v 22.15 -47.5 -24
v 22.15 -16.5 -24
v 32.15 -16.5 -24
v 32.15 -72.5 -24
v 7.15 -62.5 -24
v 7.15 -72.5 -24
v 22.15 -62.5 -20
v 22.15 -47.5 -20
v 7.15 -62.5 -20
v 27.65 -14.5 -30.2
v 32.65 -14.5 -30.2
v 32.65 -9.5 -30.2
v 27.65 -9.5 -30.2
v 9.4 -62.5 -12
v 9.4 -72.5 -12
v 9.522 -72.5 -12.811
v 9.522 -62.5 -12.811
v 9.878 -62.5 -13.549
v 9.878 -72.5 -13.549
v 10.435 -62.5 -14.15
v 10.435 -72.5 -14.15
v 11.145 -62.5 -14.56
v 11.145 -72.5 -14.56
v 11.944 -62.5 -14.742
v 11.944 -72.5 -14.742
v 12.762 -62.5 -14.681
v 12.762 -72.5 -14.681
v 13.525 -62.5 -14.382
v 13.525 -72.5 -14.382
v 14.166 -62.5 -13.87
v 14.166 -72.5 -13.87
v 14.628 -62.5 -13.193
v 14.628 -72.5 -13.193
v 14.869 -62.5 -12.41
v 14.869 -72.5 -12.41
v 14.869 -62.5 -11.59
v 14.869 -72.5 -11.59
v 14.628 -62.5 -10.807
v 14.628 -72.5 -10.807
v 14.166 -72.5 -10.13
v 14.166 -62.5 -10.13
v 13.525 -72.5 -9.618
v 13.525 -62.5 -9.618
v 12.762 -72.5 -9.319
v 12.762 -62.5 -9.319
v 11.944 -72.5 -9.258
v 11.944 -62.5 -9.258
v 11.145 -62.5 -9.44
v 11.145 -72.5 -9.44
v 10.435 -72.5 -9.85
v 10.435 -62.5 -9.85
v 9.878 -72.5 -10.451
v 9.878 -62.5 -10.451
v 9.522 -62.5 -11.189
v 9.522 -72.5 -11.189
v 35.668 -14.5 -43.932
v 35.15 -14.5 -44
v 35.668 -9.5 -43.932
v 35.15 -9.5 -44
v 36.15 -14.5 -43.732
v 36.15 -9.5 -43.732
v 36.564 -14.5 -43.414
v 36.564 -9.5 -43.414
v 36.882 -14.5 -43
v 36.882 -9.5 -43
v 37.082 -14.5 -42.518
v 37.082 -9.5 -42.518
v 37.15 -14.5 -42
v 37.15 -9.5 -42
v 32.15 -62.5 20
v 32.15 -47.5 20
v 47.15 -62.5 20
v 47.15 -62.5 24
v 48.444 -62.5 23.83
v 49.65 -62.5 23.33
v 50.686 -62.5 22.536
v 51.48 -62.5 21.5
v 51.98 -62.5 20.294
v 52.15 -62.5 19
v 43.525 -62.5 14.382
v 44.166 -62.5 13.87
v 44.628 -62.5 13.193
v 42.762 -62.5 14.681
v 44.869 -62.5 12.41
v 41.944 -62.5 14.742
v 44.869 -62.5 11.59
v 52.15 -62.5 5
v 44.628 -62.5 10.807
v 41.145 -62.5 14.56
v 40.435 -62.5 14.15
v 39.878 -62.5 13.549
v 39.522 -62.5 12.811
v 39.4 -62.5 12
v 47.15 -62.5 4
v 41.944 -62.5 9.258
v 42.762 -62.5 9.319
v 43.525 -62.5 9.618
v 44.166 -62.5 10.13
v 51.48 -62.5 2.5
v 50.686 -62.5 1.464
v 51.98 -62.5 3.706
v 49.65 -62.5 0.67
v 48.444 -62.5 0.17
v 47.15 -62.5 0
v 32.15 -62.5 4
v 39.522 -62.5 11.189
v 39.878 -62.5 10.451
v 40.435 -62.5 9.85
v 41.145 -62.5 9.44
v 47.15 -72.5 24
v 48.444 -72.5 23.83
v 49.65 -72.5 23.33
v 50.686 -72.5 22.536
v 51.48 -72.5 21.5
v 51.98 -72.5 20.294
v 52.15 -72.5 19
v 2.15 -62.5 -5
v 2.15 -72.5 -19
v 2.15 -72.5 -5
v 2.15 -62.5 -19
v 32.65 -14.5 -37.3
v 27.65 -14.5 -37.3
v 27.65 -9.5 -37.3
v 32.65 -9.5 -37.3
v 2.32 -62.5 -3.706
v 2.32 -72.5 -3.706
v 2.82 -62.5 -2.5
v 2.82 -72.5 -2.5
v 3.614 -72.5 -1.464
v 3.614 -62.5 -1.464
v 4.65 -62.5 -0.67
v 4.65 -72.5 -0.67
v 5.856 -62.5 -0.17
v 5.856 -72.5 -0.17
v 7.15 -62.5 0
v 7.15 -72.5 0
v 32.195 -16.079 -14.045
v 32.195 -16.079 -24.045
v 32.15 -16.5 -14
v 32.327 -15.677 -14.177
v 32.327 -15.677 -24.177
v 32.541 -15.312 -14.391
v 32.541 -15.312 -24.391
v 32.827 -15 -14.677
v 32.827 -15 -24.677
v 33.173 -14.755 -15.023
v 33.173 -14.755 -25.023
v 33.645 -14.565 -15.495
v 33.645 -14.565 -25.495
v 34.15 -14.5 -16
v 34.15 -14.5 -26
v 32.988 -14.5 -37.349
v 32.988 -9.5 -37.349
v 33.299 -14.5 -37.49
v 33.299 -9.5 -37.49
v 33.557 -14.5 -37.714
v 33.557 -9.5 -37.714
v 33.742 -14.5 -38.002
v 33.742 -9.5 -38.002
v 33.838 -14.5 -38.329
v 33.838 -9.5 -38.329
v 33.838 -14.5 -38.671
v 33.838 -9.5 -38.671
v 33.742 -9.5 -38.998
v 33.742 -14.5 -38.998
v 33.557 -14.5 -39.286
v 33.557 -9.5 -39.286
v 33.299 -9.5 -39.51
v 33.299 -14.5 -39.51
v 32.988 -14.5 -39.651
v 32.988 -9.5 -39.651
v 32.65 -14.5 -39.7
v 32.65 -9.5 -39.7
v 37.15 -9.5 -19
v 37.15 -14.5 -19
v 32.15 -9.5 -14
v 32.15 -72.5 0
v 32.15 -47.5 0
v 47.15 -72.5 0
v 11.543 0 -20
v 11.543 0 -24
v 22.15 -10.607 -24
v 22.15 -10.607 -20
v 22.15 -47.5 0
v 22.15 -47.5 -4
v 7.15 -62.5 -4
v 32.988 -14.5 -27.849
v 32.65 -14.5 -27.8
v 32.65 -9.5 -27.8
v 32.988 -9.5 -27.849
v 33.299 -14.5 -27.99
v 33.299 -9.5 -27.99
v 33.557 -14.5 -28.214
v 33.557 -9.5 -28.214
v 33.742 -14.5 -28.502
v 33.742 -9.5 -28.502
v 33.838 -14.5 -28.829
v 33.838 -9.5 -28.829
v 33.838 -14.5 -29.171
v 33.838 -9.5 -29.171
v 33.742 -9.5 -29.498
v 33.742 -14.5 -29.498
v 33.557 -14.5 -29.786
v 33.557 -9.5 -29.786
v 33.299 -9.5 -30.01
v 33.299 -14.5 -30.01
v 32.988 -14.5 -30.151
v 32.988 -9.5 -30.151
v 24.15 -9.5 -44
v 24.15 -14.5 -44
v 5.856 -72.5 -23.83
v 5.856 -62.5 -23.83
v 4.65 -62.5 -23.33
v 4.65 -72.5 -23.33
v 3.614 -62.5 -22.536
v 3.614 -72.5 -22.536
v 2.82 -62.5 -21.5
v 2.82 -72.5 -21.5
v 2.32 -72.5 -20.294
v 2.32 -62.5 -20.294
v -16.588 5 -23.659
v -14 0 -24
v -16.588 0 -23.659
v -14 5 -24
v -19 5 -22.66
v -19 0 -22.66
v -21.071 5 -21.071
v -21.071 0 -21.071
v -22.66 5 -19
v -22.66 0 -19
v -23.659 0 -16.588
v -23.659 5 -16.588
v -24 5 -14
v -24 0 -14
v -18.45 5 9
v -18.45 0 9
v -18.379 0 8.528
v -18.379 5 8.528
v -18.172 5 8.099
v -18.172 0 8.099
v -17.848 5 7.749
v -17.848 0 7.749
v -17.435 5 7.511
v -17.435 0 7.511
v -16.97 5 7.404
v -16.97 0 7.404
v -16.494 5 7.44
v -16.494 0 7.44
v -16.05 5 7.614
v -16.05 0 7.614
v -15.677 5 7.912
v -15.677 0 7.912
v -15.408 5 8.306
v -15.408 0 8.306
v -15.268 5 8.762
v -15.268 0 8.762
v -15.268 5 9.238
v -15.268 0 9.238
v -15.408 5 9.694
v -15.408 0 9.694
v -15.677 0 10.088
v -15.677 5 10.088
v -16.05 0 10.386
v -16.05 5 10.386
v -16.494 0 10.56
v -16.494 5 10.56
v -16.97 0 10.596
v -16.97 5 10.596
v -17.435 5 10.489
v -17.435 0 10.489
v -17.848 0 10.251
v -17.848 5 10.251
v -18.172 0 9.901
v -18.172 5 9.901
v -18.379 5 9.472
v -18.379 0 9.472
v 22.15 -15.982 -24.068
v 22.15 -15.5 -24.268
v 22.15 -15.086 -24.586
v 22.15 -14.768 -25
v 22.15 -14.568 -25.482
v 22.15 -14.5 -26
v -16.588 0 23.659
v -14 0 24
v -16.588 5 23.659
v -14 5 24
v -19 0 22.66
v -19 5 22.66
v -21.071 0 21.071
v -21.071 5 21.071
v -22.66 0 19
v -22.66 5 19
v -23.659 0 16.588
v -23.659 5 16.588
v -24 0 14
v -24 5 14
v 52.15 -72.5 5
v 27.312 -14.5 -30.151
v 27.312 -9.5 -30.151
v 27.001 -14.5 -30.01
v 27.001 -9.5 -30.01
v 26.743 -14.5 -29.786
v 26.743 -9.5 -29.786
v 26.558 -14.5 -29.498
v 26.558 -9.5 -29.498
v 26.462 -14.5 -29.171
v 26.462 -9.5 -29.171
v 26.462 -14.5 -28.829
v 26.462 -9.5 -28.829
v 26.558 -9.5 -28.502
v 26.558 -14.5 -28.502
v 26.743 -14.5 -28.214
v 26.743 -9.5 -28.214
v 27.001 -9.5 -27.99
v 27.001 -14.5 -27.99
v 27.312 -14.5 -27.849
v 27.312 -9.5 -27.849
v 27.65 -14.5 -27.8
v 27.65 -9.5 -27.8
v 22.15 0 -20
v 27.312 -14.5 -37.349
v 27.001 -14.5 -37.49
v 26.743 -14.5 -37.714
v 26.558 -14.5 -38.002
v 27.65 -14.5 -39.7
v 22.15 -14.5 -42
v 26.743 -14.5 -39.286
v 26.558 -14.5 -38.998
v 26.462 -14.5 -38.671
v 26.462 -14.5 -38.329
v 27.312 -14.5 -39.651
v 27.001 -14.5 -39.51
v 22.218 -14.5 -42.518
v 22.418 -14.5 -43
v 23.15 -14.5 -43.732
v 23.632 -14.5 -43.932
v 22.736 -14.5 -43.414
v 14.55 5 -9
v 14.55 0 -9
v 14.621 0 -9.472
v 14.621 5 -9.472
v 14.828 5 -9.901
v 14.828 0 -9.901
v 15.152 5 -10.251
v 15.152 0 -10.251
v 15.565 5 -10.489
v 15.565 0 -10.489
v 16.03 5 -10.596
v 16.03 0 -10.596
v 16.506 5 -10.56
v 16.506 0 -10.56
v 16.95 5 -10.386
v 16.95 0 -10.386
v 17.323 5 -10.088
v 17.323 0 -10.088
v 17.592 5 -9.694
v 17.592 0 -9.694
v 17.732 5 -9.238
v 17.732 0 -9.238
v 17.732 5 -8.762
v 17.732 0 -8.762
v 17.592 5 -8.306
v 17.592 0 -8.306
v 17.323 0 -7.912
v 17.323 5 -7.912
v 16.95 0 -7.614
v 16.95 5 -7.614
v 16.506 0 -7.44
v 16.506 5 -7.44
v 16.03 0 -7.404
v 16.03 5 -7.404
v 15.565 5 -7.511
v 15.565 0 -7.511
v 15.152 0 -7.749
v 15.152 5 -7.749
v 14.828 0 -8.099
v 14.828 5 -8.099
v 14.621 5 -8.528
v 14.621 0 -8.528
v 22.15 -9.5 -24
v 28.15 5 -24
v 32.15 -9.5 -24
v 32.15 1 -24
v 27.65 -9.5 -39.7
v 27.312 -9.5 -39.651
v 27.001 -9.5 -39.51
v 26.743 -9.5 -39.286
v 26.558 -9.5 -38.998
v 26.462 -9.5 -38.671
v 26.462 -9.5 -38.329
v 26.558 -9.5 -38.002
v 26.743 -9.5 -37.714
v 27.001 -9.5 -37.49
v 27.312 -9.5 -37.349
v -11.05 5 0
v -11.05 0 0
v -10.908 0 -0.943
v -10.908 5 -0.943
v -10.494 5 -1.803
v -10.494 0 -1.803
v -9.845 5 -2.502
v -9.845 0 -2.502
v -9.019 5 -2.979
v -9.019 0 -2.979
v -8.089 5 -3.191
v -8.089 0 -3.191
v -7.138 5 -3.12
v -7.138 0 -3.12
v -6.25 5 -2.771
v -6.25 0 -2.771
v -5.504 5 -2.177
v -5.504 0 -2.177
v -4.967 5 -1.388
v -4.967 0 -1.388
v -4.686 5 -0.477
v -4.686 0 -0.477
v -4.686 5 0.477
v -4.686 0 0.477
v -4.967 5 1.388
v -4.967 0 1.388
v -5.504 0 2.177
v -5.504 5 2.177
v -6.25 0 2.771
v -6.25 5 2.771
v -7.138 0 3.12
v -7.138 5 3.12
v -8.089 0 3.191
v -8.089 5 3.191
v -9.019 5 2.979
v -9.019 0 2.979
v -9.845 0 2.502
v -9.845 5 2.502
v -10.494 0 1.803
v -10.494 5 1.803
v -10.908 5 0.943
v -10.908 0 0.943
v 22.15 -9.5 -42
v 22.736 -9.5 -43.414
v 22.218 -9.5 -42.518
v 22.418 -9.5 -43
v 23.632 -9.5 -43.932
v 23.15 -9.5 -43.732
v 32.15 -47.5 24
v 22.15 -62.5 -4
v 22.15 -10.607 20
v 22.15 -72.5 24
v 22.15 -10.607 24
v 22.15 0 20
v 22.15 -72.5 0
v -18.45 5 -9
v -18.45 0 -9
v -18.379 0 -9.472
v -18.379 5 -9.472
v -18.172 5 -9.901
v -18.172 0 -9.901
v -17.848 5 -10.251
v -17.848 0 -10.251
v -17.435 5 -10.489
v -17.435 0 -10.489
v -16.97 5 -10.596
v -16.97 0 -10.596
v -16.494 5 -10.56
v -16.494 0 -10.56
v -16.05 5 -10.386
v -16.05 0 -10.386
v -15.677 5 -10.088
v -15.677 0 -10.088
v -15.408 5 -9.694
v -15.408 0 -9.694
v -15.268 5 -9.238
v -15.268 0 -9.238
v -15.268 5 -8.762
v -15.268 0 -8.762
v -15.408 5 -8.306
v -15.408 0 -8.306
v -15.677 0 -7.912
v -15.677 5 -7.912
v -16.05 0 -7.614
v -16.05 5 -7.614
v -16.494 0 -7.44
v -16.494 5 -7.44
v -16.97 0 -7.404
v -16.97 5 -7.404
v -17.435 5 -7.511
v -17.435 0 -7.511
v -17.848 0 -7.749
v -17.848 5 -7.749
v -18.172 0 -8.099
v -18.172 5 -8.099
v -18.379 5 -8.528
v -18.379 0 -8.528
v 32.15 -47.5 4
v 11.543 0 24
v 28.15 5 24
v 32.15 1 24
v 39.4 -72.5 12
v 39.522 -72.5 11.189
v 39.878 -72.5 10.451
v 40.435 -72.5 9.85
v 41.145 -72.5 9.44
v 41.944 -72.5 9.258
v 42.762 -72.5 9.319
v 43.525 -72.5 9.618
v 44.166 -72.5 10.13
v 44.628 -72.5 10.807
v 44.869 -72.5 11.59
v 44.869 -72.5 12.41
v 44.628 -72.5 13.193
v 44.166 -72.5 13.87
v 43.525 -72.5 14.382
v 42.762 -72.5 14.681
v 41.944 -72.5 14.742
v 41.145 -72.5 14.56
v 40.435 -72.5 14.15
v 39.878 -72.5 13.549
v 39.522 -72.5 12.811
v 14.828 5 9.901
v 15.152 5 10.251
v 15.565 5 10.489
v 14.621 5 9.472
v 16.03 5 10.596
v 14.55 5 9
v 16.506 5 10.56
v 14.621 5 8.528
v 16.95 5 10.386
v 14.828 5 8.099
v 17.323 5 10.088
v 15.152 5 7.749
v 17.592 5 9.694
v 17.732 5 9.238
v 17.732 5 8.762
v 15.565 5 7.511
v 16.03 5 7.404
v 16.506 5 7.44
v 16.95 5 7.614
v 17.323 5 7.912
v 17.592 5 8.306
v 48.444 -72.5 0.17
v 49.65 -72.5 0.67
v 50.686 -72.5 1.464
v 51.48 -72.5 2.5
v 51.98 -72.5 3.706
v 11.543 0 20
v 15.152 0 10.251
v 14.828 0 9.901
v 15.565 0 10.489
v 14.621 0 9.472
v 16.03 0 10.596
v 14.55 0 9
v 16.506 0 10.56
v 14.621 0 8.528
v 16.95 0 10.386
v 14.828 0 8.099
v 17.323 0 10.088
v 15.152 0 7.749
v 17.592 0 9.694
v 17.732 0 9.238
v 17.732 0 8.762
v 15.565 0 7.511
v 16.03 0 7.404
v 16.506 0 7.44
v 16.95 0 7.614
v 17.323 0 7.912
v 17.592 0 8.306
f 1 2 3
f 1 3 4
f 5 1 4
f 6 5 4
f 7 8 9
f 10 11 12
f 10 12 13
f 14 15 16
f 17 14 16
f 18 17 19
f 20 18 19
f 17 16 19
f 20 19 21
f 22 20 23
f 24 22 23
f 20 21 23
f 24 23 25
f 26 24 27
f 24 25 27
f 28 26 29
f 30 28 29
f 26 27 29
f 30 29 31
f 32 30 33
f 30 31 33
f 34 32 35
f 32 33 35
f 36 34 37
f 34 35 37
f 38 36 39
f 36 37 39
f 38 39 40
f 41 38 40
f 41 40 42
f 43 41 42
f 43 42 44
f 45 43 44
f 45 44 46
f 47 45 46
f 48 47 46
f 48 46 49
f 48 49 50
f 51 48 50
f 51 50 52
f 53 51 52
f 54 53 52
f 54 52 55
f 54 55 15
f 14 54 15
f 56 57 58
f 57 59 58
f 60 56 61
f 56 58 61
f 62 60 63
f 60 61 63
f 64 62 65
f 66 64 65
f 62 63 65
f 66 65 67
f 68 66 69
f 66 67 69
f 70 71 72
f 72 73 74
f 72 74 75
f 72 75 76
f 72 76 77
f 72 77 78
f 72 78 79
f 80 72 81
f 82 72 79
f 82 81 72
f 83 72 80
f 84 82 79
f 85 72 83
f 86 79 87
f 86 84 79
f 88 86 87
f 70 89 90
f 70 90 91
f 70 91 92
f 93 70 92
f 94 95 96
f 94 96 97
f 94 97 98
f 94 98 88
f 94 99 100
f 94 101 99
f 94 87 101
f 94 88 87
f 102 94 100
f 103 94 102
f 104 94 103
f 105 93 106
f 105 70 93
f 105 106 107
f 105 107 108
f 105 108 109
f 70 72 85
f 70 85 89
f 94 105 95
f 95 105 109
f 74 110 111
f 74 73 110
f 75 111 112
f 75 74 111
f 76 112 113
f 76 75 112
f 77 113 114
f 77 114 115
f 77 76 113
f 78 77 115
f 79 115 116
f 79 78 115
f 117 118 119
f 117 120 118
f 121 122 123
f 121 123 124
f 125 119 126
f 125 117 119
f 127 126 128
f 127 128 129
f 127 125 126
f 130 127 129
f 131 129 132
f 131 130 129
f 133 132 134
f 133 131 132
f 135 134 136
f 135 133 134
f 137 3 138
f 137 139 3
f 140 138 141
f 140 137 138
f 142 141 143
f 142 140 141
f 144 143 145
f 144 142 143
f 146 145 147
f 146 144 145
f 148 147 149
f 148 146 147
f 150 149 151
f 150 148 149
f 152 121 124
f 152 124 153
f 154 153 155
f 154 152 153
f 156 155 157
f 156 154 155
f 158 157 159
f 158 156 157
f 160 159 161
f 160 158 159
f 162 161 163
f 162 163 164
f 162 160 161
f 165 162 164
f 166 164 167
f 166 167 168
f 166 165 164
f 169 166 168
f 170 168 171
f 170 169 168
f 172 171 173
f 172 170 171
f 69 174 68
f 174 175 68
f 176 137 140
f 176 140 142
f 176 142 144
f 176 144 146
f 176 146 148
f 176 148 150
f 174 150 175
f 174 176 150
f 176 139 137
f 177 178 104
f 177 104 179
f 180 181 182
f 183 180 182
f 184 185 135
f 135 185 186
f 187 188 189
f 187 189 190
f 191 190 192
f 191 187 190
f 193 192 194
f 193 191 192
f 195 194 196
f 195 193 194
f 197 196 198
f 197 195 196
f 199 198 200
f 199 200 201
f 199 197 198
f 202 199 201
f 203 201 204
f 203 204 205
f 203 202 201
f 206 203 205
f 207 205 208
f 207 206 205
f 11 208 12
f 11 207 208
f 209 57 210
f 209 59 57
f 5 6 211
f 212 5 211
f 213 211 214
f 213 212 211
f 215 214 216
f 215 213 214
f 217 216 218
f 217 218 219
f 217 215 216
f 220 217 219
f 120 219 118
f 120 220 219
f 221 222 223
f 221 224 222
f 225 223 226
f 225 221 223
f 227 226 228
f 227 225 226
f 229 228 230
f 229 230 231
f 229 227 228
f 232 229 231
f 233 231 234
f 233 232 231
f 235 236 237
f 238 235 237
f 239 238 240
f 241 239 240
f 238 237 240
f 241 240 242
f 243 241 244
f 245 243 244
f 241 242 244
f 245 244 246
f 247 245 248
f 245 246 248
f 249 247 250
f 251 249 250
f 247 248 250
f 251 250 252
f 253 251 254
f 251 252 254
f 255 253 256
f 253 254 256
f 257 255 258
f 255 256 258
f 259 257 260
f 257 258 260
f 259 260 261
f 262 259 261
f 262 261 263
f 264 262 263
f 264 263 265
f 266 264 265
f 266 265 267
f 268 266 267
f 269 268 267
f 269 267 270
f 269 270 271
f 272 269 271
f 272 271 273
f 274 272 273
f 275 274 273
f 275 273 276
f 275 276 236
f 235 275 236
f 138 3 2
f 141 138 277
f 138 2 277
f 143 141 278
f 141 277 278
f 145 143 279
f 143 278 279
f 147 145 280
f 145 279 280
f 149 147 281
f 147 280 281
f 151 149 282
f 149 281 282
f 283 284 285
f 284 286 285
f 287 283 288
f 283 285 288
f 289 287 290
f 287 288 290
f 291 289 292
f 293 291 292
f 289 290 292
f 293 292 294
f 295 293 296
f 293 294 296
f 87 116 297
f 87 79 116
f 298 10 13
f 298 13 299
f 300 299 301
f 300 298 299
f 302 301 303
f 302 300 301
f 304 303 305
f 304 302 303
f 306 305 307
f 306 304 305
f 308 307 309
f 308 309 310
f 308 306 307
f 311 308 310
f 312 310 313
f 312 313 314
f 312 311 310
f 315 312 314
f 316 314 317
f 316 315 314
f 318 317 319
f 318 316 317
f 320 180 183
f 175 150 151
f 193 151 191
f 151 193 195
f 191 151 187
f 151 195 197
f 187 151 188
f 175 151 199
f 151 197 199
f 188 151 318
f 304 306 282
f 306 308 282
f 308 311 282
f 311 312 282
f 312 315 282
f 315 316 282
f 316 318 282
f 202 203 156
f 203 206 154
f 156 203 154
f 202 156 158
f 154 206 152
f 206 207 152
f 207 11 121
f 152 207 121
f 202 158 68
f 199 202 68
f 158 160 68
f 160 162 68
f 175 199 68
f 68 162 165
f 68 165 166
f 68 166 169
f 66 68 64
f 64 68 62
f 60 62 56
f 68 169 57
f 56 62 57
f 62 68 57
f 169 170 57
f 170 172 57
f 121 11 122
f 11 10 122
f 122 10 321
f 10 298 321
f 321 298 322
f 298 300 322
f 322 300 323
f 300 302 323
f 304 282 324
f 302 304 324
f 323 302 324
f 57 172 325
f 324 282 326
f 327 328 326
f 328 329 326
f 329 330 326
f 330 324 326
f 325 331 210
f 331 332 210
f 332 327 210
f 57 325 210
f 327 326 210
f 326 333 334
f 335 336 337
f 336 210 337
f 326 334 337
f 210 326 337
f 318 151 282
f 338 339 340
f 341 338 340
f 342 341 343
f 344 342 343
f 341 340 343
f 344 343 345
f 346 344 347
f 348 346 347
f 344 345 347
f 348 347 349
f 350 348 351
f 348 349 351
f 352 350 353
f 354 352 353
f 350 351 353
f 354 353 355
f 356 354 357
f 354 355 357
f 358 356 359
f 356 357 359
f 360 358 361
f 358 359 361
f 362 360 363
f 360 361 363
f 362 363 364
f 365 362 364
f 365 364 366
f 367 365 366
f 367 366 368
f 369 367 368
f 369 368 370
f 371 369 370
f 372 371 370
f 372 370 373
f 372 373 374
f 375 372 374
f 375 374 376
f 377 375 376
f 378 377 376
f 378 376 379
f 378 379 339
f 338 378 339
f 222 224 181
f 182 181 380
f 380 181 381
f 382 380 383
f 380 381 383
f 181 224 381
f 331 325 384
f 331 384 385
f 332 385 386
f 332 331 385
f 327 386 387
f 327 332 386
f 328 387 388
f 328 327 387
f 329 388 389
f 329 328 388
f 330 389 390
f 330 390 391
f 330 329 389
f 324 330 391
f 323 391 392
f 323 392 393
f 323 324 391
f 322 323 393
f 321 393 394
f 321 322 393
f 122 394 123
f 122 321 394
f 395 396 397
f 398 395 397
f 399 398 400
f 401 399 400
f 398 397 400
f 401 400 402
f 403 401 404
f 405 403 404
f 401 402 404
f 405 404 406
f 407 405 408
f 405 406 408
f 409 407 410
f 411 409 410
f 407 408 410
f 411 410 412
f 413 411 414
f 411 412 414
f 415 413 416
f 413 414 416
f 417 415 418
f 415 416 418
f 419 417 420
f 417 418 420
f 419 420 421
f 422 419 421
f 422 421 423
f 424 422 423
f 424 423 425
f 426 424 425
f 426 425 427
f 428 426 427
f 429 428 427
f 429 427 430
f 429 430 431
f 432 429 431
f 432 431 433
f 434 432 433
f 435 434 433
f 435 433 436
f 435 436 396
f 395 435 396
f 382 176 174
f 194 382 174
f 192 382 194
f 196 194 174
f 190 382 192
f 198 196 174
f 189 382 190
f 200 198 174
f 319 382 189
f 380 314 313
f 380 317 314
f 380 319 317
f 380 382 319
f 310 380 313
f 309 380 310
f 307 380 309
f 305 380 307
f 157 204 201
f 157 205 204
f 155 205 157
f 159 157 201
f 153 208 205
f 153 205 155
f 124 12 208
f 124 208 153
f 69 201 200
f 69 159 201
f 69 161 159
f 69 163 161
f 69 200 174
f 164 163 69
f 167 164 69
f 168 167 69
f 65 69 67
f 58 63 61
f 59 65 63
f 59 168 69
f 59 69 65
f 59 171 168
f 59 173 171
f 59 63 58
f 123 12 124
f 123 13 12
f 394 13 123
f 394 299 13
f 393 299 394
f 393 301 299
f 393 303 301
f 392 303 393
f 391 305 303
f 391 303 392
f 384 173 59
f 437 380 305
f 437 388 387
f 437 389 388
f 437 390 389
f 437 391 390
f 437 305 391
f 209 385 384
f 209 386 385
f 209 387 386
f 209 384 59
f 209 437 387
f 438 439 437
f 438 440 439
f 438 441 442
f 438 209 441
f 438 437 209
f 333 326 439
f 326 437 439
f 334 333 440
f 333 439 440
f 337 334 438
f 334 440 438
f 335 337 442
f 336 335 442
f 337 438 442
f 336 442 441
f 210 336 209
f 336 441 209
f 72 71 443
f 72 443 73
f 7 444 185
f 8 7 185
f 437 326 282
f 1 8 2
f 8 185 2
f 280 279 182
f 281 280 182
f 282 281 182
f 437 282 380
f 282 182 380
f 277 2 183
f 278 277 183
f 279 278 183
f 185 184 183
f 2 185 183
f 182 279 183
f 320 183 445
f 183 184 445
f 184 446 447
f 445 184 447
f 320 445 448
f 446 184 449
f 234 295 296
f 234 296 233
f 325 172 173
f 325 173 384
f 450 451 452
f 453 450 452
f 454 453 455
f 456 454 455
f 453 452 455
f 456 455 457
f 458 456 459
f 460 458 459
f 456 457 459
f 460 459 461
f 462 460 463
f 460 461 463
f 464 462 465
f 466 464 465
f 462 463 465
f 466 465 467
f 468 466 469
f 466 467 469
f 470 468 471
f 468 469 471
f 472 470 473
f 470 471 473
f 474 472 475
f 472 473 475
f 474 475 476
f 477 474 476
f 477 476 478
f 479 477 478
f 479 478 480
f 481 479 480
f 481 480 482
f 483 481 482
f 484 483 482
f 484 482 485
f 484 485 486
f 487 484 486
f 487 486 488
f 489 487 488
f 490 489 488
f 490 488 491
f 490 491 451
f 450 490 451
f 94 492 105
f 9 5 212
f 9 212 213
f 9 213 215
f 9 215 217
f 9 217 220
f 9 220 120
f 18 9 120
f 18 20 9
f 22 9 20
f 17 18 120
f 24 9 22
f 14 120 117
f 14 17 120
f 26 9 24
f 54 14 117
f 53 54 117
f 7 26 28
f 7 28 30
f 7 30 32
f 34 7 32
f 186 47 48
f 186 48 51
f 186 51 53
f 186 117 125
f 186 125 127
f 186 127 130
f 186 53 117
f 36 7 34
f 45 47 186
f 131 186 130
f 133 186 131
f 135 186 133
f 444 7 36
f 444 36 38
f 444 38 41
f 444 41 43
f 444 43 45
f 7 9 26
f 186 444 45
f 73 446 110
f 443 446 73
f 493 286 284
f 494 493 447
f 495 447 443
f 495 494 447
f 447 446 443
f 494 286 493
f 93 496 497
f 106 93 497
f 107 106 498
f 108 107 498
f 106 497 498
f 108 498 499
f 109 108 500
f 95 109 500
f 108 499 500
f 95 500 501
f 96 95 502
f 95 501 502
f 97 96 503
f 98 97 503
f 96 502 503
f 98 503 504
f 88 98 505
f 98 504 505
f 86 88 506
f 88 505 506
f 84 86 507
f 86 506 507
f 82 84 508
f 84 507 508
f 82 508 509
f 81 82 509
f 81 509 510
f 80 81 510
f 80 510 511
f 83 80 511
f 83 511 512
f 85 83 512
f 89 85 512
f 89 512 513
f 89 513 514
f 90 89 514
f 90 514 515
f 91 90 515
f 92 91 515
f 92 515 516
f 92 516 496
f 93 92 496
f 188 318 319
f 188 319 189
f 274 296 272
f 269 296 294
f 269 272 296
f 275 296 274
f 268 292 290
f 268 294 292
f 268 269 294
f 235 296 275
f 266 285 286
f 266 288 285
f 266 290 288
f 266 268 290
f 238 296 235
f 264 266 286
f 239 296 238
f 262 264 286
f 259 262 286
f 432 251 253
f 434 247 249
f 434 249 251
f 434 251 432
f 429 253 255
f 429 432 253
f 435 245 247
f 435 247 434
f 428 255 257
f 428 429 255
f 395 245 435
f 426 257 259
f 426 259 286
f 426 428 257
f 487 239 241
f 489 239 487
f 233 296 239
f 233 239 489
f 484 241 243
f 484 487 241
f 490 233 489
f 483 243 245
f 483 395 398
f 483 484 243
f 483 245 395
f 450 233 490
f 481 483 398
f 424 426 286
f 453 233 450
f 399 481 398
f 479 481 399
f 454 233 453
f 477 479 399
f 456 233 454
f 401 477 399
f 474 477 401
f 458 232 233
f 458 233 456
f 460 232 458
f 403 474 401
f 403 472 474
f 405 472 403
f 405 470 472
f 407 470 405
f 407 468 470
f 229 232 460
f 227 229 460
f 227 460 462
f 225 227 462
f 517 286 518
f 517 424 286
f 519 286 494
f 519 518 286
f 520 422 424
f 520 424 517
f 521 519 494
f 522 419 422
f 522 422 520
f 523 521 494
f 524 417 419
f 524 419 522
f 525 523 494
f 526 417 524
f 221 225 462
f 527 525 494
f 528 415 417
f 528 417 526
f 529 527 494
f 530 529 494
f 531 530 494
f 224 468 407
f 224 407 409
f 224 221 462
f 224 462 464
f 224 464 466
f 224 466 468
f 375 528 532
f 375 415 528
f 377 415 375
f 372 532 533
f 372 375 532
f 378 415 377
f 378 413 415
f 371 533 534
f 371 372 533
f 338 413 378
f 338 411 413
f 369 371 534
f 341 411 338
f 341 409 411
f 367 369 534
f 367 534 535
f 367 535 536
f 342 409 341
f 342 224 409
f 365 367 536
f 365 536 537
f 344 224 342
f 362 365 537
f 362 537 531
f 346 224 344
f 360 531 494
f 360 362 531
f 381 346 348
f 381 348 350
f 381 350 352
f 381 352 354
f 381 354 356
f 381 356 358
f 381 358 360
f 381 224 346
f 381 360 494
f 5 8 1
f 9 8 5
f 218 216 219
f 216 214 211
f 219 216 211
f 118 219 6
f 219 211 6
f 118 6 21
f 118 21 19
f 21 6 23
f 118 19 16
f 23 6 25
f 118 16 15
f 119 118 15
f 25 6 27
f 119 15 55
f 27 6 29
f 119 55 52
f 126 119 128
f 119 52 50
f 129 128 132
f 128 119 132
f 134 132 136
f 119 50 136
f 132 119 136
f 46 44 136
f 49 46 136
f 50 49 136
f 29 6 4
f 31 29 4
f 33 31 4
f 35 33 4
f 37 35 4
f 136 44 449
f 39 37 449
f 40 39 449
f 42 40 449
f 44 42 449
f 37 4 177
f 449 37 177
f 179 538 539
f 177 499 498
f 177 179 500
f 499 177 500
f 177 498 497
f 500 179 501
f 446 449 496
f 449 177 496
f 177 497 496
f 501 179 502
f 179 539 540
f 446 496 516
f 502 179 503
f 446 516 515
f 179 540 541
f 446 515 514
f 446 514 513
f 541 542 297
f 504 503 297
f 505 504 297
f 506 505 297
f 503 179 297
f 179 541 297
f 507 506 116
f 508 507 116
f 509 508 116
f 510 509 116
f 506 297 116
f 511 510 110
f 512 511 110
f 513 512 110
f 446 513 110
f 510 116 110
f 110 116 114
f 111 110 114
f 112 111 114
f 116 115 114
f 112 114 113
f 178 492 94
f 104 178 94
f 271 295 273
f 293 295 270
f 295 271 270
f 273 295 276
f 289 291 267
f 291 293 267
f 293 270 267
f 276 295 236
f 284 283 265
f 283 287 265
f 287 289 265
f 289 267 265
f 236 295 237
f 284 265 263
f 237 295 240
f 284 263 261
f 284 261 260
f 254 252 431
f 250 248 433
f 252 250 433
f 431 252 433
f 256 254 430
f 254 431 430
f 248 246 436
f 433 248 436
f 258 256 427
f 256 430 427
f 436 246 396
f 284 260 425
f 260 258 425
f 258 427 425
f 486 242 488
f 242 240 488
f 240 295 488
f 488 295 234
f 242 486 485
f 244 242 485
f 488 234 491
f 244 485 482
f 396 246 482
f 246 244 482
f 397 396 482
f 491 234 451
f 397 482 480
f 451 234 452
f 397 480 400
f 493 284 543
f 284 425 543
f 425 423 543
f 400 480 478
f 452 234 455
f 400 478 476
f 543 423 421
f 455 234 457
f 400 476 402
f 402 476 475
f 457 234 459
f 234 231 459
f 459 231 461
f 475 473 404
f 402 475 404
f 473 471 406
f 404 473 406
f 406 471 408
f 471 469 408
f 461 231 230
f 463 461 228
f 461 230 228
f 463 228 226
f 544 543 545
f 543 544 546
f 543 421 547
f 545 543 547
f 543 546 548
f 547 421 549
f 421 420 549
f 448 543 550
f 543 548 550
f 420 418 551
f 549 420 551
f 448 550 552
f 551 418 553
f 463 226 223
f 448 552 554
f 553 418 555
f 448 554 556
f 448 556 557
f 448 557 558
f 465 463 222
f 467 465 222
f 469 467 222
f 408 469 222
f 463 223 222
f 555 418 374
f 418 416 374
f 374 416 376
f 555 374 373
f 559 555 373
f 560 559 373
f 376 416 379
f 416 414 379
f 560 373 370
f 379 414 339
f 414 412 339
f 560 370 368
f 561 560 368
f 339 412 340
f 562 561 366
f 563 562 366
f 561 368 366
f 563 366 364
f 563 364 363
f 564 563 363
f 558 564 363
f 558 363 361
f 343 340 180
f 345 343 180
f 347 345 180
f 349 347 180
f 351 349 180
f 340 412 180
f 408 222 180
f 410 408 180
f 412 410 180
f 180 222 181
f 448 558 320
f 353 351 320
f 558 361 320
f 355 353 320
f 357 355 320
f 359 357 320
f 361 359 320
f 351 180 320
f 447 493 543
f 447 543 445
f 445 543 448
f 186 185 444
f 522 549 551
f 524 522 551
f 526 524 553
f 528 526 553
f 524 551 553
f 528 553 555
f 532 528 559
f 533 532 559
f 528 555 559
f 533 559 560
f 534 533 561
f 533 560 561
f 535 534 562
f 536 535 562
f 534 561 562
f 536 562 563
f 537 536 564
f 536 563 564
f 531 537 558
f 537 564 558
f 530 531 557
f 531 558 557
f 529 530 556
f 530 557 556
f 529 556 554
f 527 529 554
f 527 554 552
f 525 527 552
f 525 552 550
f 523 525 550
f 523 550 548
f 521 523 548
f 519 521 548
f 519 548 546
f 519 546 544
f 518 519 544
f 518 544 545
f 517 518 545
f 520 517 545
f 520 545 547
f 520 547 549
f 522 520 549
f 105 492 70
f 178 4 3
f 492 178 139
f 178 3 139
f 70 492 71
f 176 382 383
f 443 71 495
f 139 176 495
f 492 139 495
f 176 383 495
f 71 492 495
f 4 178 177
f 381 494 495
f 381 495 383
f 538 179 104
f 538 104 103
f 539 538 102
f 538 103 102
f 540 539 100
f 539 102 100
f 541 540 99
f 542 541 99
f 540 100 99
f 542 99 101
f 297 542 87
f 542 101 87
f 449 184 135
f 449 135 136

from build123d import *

# Parameters (mm, degrees)
SKETCH1_W                 = 56.15
SKETCH1_H                 = 48
BOSS_EXTRUDE1_DEPTH       = 5
SKETCH2_W                 = 10
SKETCH2_H                 = 48
BOSS_EXTRUDE2_DEPTH       = 72.5
SKETCH3_W                 = 24
SKETCH3_H                 = 10
BOSS_EXTRUDE3_DEPTH       = 20
SKETCH20_W                = 24
SKETCH20_H                = 10
BOSS_EXTRUDE5_DEPTH       = 20
FILLET1_R                 = 10
F_1_0MM_DOWEL_HOLE1_D     = 5.5
F_1_0MM_DOWEL_HOLE1_DEPTH = 10
FILLET2_R                 = 5
RIB1_REACH                = 103.39
SKETCH19_WALL_W           = 225.992615606
SKETCH19_WALL_H           = 4
M3_CLEARANCE_HOLE1_D      = 3.2
M3_CLEARANCE_HOLE1_DEPTH  = 5
M6_CLEARANCE_HOLE1_D      = 6.4
CHAMFER2_SIZE             = 4
SKETCH14_W                = 15
SKETCH14_H                = 5
BOSS_EXTRUDE4_DEPTH       = 20
CHAMFER3_SIZE             = 10
FILLET3_R                 = 2
M2_START                  = -14.5
M2_CLEARANCE_SLOT2_DEPTH  = 5
RIB5_REACH                = 103.39
SKETCH21_WALL_W           = 225.992615606
SKETCH21_WALL_H           = 4
BOSS_EXTRUDE6_DEPTH       = 4


# Read off the part's stored shape, not the designer's step: M2 Clearance Slot2
with BuildPart() as part:
    # Sketch1 → Boss-Extrude1 (new body)
    with BuildSketch(Plane(origin=(0, 0, 0), x_dir=(1, 0, 0), z_dir=(0, 1, 0))):
        with Locations((4.075, 0)):
            Rectangle(SKETCH1_W, SKETCH1_H)
    extrude(amount=BOSS_EXTRUDE1_DEPTH)

    # Sketch2 → Boss-Extrude2 (add)
    with BuildSketch(Plane.XZ):
        with Locations((27.15, 0)):
            Rectangle(SKETCH2_W, SKETCH2_H)
    extrude(amount=BOSS_EXTRUDE2_DEPTH)

    # Sketch3 → Boss-Extrude3 (add)
    with BuildSketch(Plane(origin=(32.15, 0, 0), x_dir=(0, 0, -1), z_dir=(1, 0, 0))):
        with Locations((-12, -67.5)):
            Rectangle(SKETCH3_W, SKETCH3_H)
    extrude(amount=BOSS_EXTRUDE3_DEPTH)

    # Sketch20 → Boss-Extrude5 (add)
    with BuildSketch(Plane.ZY.offset(-22.15)):
        with Locations((-12, -67.5)):
            Rectangle(SKETCH20_W, SKETCH20_H)
    extrude(amount=BOSS_EXTRUDE5_DEPTH)

    # Fillet1
    fillet1_edges = [part.edges().sort_by_distance(p)[0] for p in [
        (-24, 2.5, -24),
        (-24, 2.5, 24),
    ]]
    fillet(fillet1_edges, radius=FILLET1_R)

    # Ø1.0mm Dowel Hole1
    with Locations(Plane(origin=(0, -62.5, 0), x_dir=(1, 0, 0), z_dir=(0, 1, 0))):
        with Locations((42.15, -12), (12.15, 12)):
            Hole(F_1_0MM_DOWEL_HOLE1_D / 2, depth=F_1_0MM_DOWEL_HOLE1_DEPTH)

    # Fillet2
    fillet2_edges = [part.edges().sort_by_distance(p)[0] for p in [
        (52.15, -67.5, 24),
        (52.15, -67.5, 0),
        (2.15, -67.5, -24),
        (2.15, -67.5, 0),
    ]]
    fillet(fillet2_edges, radius=FILLET2_R)

    # Sketch19 wall → Rib1 (add, up to next)
    with BuildSketch(Plane(origin=(39.65, -55, 24), x_dir=(0.707106781187, -0.707106781187, 0), z_dir=(0.707106781187, 0.707106781187, 0)), mode=Mode.PRIVATE) as rib1_sk1:
        with Locations((0, 2)):
            Rectangle(SKETCH19_WALL_W, SKETCH19_WALL_H)
    rib1_tool1 = extrude(rib1_sk1.sketch, amount=-RIB1_REACH, mode=Mode.PRIVATE) - part.part
    rib1 = rib1_tool1.solids().sort_by_distance((39.65, -55, 24))[0]
    add(rib1)

    # M3 Clearance Hole1
    with Locations(Plane(origin=(0, 5, 0), x_dir=(1, 0, 0), z_dir=(0, 1, 0))):
        with Locations((-16.85, -9), (-16.85, 9), (16.15, 9), (16.15, -9)):
            Hole(M3_CLEARANCE_HOLE1_D / 2, depth=M3_CLEARANCE_HOLE1_DEPTH)

    # M6 Clearance Hole1 (through all)
    with Locations(Plane(origin=(0, 5, 0), x_dir=(1, 0, 0), z_dir=(0, 1, 0))):
        with Locations((-7.85, 0)):
            Hole(M6_CLEARANCE_HOLE1_D / 2)

    # Chamfer2
    chamfer2_edges = [part.edges().sort_by_distance(p)[0] for p in [
        (32.15, 5, 0),
    ]]
    chamfer(chamfer2_edges, length=CHAMFER2_SIZE)

    # Sketch14 → Boss-Extrude4 (add)
    with BuildSketch(Plane(origin=(0, 0, -24), x_dir=(-1, 0, 0), z_dir=(0, 0, -1))):
        with Locations((-29.65, -12)):
            Rectangle(SKETCH14_W, SKETCH14_H)
    extrude(amount=BOSS_EXTRUDE4_DEPTH)

    # Chamfer3
    # the kernel refuses this chamfer: 10 mm, written as the material it adds along each edge
    with BuildSketch(Plane(origin=(32.15, -9.5, -24), x_dir=(-0.027495876610586317, 0, 0.9996219169112968), z_dir=(0, -1, 0))) as chamfer3_piece_1_section:
        Polygon((CHAMFER3_SIZE * 0.999621916911, -CHAMFER3_SIZE * 0.0274958766106), (-CHAMFER3_SIZE * 0.0274958766106, -CHAMFER3_SIZE * 0.999621916911), (0, 0), align=None)
    chamfer3_piece_1 = extrude(amount=5, mode=Mode.PRIVATE)
    chamfer3_piece_1 = split(chamfer3_piece_1, bisect_by=Plane(origin=(37.15, -12, -20.111111111), z_dir=(-1, 0, 0)), keep=Keep.TOP, mode=Mode.PRIVATE)
    add(chamfer3_piece_1)

    # Fillet3
    fillet3_edges = [part.edges().sort_by_distance(p)[0] for p in [
        (27.15, -14.5, -24),
        (22.15, -12, -44),
        (37.15, -12, -44),
        (32.15, -14.5, -19),
    ]]
    fillet(fillet3_edges, radius=FILLET3_R)

    # M2 Clearance Slot2 outline → M2 Clearance Slot2 (cut)
    with BuildSketch(Plane(origin=(0, 0, 0), x_dir=(1, 0, 0), z_dir=(0, 1, 0)).offset(M2_START)):
        with BuildLine():
            Line((32.65, 39.7), (27.65, 39.7))
            ThreePointArc((27.65, 39.7), (26.45, 38.5), (27.65, 37.3))
            Line((27.65, 37.3), (32.65, 37.3))
            ThreePointArc((32.65, 37.3), (33.85, 38.5), (32.65, 39.7))
        make_face()
        with BuildLine():
            ThreePointArc((32.65, 27.8), (33.85, 29), (32.65, 30.2))
            Line((32.65, 30.2), (27.65, 30.2))
            ThreePointArc((27.65, 30.2), (26.45, 29), (27.65, 27.8))
            Line((27.65, 27.8), (32.65, 27.8))
        make_face()
    extrude(amount=M2_CLEARANCE_SLOT2_DEPTH, mode=Mode.SUBTRACT)

    # Mirror1: Rib1 across plane
    add(rib1.mirror(Plane(origin=(52.15, -62.5, 12), x_dir=(1, 0, 0), z_dir=(0, 0, -1))))

    # Sketch21 wall → Rib5 (add, up to next)
    with BuildSketch(Plane(origin=(14.65, -55, -24), x_dir=(-0.707106781187, -0.707106781187, 0), z_dir=(-0.707106781187, 0.707106781187, 0)), mode=Mode.PRIVATE) as rib5_sk1:
        with Locations((0, 2)):
            Rectangle(SKETCH21_WALL_W, SKETCH21_WALL_H)
    rib5_tool1 = extrude(rib5_sk1.sketch, amount=-RIB5_REACH, mode=Mode.PRIVATE) - part.part
    rib5 = rib5_tool1.solids().sort_by_distance((14.65, -55, -24))[0]
    add(rib5)

    # Mirror2: Rib5 across plane
    add(rib5.mirror(Plane(origin=(2.15, -62.5, -12), x_dir=(1, 0, 0), z_dir=(0, 0, 1))))

    # Sketch24 → Boss-Extrude6 (add)
    with BuildSketch(Plane.XY.offset(24)):
        Polygon((11.543398282, 0), (22.15, -10.606601718), (22.15, 0), align=None)
    boss_extrude6 = extrude(amount=-BOSS_EXTRUDE6_DEPTH)

    # Mirror3: Boss-Extrude6 across plane
    add(boss_extrude6.mirror(Plane.XY))


solid = part.part
